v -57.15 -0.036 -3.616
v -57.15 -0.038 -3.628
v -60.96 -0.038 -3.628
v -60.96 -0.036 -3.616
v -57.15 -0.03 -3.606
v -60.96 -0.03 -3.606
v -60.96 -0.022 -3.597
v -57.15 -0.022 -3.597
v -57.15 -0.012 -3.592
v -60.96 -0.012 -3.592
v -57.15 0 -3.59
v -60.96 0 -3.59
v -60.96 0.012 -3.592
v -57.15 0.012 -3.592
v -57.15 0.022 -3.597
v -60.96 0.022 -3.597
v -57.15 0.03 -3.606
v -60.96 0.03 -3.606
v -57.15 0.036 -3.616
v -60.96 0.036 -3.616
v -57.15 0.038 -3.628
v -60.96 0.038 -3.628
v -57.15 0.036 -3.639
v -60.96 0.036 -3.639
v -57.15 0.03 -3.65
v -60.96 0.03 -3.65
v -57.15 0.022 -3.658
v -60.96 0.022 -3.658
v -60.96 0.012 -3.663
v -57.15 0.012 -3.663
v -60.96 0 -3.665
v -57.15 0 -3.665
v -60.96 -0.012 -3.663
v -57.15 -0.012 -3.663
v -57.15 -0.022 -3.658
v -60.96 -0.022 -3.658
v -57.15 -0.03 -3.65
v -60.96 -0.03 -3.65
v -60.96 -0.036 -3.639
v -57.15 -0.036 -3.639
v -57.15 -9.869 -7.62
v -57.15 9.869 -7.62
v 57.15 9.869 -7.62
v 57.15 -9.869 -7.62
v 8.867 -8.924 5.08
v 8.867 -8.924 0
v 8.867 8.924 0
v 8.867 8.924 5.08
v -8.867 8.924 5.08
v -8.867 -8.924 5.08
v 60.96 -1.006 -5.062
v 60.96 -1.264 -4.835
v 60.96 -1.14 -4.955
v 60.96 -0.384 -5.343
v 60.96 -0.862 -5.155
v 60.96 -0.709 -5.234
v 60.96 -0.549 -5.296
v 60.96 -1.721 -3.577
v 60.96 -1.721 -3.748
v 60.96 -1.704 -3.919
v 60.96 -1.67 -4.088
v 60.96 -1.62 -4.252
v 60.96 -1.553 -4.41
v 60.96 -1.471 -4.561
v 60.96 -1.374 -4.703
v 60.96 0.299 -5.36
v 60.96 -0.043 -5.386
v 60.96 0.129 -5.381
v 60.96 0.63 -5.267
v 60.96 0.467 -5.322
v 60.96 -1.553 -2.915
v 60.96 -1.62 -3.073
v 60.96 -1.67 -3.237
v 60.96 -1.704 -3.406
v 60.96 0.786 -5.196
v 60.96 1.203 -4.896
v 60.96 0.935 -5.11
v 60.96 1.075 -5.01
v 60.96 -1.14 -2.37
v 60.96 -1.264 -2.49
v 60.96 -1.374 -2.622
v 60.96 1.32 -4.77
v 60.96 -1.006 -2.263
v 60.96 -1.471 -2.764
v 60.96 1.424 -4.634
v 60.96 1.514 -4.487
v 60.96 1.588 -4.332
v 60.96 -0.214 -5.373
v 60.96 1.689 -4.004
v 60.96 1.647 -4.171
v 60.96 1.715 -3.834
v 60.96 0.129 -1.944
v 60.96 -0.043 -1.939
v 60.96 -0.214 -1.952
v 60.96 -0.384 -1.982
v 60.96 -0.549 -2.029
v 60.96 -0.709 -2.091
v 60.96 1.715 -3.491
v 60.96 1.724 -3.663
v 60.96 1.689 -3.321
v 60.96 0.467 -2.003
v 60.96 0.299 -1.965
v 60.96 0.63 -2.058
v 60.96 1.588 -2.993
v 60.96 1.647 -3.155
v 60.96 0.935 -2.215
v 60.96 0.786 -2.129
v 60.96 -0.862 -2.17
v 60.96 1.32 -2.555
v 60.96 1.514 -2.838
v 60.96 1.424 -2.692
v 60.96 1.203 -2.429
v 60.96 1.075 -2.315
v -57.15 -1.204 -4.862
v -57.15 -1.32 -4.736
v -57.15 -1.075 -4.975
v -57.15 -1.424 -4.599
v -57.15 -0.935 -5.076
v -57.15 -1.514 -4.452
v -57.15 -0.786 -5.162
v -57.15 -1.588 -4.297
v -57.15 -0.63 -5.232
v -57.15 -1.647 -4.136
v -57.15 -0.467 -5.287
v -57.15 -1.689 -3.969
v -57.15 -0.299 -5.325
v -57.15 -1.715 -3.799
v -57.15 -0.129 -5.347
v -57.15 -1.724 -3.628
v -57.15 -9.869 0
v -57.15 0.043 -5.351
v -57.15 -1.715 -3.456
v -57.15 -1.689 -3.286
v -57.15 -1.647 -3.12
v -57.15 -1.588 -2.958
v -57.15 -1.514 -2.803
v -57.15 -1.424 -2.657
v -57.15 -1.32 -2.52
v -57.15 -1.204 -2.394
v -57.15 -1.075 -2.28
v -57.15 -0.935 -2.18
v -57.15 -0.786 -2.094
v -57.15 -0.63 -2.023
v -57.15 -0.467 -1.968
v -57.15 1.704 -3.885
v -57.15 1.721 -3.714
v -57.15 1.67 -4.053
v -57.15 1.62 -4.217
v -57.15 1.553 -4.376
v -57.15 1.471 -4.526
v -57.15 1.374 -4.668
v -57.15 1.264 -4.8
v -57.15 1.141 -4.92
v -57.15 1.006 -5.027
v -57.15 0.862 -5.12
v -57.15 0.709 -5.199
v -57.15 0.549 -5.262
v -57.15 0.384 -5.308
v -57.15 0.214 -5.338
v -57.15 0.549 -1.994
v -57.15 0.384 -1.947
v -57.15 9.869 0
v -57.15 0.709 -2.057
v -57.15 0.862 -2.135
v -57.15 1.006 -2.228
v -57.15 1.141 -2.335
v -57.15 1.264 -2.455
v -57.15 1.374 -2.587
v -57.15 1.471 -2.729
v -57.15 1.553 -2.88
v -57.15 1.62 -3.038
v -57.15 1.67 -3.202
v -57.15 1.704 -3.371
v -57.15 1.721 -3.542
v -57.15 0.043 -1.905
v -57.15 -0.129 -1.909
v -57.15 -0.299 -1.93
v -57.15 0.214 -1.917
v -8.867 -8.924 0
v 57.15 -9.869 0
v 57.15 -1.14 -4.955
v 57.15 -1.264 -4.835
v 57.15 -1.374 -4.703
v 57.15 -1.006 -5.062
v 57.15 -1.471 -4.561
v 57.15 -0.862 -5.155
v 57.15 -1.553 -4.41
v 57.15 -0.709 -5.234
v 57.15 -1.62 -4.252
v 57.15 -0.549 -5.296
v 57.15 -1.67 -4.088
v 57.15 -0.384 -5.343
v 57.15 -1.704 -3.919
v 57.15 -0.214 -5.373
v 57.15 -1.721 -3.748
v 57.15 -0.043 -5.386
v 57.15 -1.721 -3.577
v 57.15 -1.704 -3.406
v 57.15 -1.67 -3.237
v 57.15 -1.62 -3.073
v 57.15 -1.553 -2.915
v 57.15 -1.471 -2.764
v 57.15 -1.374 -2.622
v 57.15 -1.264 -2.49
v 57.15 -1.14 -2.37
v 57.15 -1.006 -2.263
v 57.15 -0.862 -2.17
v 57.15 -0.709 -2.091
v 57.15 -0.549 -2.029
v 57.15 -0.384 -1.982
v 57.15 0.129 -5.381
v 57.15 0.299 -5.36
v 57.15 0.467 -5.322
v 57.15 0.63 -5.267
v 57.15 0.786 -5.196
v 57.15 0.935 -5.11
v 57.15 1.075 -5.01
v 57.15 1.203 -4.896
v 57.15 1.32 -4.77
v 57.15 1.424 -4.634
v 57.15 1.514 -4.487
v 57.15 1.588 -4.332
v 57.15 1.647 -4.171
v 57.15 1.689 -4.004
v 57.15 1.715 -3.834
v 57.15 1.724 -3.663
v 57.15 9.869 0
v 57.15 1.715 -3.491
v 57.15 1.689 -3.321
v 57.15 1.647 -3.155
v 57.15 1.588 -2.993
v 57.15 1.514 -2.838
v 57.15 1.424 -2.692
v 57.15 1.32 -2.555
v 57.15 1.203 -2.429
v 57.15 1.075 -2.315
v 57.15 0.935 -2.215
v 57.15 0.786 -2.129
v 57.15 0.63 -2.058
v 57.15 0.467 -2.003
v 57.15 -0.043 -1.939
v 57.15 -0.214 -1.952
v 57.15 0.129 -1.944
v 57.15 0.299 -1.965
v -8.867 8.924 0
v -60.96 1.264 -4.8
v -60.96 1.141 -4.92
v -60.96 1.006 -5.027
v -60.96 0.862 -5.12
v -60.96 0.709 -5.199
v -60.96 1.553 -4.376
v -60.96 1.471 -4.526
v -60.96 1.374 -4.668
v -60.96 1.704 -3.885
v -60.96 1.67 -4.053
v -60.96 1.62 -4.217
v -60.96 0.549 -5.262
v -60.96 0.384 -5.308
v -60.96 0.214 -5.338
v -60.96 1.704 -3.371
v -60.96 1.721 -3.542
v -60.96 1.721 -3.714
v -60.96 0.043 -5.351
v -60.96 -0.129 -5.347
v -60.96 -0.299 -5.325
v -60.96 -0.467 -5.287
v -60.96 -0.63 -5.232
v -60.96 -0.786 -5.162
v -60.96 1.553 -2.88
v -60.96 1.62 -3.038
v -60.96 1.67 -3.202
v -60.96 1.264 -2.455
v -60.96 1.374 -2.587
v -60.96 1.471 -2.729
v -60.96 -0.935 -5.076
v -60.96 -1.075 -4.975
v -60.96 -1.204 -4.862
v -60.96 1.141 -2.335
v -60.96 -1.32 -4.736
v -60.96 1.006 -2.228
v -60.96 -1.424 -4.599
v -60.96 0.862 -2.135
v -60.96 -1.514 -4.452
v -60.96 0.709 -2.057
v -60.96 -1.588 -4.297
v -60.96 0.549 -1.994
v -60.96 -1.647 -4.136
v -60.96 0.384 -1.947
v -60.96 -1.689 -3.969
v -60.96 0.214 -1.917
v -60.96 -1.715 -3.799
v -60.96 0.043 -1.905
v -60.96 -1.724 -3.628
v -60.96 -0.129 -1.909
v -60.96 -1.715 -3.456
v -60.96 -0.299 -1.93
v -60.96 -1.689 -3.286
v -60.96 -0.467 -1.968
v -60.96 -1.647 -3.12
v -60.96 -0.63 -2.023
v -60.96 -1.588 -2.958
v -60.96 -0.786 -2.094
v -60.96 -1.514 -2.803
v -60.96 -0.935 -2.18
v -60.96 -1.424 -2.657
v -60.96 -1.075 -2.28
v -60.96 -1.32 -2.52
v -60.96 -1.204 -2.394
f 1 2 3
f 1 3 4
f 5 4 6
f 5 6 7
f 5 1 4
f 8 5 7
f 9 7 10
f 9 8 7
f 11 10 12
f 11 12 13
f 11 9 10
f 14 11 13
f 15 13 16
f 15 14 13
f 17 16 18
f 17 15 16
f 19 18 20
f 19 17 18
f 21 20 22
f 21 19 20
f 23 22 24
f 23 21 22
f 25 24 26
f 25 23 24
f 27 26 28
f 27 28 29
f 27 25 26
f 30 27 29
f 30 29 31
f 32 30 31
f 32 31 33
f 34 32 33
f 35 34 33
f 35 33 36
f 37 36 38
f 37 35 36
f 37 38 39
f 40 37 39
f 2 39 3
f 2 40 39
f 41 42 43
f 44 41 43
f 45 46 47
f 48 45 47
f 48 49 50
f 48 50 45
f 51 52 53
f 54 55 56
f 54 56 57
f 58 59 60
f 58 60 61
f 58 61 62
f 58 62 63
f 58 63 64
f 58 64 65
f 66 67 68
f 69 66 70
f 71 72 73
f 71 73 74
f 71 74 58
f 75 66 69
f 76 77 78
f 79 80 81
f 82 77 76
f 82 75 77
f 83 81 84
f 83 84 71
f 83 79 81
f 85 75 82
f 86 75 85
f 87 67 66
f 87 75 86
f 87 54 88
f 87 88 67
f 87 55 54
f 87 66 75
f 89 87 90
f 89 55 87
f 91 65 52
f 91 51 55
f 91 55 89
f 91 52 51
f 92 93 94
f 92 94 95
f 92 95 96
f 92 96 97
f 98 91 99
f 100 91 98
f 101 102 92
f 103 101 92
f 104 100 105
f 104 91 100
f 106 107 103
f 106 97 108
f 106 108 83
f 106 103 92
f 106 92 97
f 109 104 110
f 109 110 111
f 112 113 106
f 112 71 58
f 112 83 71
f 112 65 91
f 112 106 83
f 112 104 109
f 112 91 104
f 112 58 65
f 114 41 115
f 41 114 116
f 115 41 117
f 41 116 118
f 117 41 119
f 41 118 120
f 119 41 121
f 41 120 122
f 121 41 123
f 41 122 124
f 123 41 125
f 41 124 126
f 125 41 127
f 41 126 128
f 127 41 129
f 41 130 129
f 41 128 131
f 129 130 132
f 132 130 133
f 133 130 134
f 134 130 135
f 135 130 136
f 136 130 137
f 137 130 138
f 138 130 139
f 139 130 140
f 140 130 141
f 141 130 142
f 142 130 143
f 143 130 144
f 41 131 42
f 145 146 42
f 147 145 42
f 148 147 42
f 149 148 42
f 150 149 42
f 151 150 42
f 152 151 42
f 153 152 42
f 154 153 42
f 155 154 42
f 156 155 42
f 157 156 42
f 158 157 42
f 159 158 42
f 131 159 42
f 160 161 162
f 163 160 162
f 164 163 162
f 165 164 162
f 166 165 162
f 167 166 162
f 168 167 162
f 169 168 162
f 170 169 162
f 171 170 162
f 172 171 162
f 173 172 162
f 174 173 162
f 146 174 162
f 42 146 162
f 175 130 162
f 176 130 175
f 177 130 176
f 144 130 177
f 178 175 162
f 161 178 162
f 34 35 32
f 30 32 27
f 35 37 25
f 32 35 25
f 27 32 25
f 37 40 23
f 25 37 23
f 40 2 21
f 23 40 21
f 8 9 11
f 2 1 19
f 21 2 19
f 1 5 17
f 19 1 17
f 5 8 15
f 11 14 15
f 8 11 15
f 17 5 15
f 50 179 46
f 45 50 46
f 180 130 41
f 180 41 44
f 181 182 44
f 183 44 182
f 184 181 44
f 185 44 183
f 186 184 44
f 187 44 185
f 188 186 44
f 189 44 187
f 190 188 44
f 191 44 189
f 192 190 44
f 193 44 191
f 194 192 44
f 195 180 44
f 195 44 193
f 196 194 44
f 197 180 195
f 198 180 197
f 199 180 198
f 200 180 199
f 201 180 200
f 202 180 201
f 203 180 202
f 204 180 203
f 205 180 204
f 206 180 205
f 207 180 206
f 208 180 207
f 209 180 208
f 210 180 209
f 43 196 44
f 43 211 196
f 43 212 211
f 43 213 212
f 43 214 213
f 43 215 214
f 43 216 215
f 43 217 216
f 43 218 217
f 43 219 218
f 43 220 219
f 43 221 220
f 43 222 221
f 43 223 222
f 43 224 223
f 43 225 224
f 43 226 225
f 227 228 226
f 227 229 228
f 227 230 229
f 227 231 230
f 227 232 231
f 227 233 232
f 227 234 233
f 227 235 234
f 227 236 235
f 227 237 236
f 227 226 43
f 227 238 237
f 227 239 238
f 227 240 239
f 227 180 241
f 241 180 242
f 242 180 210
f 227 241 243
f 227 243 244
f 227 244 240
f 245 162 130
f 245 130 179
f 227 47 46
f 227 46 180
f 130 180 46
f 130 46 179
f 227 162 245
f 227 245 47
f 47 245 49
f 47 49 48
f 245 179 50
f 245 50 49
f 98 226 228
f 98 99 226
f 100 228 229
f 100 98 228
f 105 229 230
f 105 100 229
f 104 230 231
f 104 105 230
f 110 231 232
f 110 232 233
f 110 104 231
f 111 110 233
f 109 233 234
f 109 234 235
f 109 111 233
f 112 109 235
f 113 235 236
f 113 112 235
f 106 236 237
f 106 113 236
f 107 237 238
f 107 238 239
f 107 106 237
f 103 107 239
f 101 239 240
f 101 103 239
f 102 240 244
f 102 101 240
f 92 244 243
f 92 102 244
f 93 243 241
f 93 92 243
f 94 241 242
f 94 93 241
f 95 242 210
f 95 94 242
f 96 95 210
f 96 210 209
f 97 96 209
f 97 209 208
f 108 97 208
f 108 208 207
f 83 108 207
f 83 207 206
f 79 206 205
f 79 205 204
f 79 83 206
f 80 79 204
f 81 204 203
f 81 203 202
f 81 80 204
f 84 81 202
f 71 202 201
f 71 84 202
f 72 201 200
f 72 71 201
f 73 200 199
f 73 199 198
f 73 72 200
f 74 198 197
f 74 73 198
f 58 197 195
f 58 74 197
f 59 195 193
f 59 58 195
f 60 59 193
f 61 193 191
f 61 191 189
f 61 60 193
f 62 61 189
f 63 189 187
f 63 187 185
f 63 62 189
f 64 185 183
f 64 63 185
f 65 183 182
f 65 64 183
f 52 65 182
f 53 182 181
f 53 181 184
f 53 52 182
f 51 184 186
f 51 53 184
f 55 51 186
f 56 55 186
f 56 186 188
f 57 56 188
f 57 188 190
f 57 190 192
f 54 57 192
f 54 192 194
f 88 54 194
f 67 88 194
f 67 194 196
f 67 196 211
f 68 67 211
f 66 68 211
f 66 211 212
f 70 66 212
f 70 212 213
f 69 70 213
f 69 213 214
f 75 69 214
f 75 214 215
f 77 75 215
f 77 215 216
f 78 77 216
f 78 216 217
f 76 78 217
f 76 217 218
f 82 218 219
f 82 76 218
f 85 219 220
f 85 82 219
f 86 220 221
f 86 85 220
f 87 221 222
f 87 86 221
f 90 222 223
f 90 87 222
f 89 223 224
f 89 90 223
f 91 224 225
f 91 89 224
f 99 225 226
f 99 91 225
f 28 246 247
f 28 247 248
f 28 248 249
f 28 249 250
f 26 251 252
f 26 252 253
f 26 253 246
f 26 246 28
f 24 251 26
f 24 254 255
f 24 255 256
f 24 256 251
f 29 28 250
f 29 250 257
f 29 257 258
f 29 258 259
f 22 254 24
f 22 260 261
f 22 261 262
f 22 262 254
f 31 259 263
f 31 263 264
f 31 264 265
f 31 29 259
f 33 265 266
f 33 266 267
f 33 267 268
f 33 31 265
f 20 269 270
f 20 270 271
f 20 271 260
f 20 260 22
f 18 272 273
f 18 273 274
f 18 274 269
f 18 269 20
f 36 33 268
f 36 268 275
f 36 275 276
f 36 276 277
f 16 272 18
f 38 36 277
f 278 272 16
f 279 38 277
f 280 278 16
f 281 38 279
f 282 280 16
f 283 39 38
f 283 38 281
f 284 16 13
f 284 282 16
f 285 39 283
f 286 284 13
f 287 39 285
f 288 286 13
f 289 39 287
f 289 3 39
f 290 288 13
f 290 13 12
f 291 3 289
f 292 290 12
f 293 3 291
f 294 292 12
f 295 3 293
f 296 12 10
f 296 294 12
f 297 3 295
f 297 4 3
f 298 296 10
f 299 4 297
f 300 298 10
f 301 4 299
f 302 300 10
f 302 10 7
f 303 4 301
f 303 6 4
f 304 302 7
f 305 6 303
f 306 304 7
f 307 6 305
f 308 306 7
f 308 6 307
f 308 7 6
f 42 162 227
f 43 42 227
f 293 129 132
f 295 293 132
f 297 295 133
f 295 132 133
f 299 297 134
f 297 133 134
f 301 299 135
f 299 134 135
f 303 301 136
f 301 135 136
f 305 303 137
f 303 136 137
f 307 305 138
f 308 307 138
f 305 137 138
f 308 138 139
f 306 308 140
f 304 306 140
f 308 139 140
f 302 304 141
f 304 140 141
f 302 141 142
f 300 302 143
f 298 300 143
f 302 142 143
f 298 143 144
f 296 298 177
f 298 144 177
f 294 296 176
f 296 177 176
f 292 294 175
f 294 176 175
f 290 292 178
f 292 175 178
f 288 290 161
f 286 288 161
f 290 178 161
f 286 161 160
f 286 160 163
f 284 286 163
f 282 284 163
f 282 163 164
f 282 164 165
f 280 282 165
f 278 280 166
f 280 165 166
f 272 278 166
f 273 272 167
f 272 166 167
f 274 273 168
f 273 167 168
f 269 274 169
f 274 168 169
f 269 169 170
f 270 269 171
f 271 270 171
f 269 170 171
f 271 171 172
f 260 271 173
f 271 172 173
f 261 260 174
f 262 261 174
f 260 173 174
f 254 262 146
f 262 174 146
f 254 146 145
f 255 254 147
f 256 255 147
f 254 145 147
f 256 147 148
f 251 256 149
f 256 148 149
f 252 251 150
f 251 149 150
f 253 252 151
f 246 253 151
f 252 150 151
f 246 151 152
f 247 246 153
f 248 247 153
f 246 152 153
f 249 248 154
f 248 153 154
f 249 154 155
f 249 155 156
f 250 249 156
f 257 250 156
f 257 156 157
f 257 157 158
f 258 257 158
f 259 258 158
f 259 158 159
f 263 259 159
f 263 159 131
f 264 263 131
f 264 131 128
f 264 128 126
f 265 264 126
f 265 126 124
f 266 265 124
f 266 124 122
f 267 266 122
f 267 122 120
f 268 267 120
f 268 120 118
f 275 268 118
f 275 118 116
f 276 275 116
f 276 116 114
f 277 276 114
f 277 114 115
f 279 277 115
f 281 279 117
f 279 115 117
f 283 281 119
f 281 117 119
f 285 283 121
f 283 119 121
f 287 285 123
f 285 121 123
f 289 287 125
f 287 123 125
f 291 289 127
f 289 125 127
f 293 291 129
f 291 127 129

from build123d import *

# Parameters (mm, degrees)
F0_W     = 17.734996
F0_H     = 17.848538
F1_DEPTH = 5.08
F2_W     = 114.3
F2_H     = 19.738256
F3_DEPTH = 7.62
F5_R     = 1.723631
F5_R_2   = 0.03756
F4_R     = 1.723627
F6_DEPTH = 3.81


with BuildPart() as f1:
    # F0 (on Top) → F1 (new body)
    with BuildSketch(Plane.XY):
        Rectangle(F0_W, F0_H)
    extrude(amount=F1_DEPTH)

    # F2 (on Top) → F3 (join)
    with BuildSketch(Plane.XY):
        Rectangle(F2_W, F2_H)
    extrude(amount=-F3_DEPTH)

    # F5 (on face) + F4 (on face) → F6 (join, symmetric)
    with BuildSketch(Plane(origin=(-57.15, 0, 0), x_dir=(0, -1, 0), z_dir=(-1, 0, 0))):
        with Locations((0, -3.627699)):
            Circle(F5_R)
        with Locations((0, -3.627699)):
            Circle(F5_R_2, mode=Mode.SUBTRACT)
    with BuildSketch(Plane.YZ.offset(57.15)):
        with Locations((0, -3.662557)):
            Circle(F4_R)
    extrude(amount=F6_DEPTH, both=True)


solid = f1.part
